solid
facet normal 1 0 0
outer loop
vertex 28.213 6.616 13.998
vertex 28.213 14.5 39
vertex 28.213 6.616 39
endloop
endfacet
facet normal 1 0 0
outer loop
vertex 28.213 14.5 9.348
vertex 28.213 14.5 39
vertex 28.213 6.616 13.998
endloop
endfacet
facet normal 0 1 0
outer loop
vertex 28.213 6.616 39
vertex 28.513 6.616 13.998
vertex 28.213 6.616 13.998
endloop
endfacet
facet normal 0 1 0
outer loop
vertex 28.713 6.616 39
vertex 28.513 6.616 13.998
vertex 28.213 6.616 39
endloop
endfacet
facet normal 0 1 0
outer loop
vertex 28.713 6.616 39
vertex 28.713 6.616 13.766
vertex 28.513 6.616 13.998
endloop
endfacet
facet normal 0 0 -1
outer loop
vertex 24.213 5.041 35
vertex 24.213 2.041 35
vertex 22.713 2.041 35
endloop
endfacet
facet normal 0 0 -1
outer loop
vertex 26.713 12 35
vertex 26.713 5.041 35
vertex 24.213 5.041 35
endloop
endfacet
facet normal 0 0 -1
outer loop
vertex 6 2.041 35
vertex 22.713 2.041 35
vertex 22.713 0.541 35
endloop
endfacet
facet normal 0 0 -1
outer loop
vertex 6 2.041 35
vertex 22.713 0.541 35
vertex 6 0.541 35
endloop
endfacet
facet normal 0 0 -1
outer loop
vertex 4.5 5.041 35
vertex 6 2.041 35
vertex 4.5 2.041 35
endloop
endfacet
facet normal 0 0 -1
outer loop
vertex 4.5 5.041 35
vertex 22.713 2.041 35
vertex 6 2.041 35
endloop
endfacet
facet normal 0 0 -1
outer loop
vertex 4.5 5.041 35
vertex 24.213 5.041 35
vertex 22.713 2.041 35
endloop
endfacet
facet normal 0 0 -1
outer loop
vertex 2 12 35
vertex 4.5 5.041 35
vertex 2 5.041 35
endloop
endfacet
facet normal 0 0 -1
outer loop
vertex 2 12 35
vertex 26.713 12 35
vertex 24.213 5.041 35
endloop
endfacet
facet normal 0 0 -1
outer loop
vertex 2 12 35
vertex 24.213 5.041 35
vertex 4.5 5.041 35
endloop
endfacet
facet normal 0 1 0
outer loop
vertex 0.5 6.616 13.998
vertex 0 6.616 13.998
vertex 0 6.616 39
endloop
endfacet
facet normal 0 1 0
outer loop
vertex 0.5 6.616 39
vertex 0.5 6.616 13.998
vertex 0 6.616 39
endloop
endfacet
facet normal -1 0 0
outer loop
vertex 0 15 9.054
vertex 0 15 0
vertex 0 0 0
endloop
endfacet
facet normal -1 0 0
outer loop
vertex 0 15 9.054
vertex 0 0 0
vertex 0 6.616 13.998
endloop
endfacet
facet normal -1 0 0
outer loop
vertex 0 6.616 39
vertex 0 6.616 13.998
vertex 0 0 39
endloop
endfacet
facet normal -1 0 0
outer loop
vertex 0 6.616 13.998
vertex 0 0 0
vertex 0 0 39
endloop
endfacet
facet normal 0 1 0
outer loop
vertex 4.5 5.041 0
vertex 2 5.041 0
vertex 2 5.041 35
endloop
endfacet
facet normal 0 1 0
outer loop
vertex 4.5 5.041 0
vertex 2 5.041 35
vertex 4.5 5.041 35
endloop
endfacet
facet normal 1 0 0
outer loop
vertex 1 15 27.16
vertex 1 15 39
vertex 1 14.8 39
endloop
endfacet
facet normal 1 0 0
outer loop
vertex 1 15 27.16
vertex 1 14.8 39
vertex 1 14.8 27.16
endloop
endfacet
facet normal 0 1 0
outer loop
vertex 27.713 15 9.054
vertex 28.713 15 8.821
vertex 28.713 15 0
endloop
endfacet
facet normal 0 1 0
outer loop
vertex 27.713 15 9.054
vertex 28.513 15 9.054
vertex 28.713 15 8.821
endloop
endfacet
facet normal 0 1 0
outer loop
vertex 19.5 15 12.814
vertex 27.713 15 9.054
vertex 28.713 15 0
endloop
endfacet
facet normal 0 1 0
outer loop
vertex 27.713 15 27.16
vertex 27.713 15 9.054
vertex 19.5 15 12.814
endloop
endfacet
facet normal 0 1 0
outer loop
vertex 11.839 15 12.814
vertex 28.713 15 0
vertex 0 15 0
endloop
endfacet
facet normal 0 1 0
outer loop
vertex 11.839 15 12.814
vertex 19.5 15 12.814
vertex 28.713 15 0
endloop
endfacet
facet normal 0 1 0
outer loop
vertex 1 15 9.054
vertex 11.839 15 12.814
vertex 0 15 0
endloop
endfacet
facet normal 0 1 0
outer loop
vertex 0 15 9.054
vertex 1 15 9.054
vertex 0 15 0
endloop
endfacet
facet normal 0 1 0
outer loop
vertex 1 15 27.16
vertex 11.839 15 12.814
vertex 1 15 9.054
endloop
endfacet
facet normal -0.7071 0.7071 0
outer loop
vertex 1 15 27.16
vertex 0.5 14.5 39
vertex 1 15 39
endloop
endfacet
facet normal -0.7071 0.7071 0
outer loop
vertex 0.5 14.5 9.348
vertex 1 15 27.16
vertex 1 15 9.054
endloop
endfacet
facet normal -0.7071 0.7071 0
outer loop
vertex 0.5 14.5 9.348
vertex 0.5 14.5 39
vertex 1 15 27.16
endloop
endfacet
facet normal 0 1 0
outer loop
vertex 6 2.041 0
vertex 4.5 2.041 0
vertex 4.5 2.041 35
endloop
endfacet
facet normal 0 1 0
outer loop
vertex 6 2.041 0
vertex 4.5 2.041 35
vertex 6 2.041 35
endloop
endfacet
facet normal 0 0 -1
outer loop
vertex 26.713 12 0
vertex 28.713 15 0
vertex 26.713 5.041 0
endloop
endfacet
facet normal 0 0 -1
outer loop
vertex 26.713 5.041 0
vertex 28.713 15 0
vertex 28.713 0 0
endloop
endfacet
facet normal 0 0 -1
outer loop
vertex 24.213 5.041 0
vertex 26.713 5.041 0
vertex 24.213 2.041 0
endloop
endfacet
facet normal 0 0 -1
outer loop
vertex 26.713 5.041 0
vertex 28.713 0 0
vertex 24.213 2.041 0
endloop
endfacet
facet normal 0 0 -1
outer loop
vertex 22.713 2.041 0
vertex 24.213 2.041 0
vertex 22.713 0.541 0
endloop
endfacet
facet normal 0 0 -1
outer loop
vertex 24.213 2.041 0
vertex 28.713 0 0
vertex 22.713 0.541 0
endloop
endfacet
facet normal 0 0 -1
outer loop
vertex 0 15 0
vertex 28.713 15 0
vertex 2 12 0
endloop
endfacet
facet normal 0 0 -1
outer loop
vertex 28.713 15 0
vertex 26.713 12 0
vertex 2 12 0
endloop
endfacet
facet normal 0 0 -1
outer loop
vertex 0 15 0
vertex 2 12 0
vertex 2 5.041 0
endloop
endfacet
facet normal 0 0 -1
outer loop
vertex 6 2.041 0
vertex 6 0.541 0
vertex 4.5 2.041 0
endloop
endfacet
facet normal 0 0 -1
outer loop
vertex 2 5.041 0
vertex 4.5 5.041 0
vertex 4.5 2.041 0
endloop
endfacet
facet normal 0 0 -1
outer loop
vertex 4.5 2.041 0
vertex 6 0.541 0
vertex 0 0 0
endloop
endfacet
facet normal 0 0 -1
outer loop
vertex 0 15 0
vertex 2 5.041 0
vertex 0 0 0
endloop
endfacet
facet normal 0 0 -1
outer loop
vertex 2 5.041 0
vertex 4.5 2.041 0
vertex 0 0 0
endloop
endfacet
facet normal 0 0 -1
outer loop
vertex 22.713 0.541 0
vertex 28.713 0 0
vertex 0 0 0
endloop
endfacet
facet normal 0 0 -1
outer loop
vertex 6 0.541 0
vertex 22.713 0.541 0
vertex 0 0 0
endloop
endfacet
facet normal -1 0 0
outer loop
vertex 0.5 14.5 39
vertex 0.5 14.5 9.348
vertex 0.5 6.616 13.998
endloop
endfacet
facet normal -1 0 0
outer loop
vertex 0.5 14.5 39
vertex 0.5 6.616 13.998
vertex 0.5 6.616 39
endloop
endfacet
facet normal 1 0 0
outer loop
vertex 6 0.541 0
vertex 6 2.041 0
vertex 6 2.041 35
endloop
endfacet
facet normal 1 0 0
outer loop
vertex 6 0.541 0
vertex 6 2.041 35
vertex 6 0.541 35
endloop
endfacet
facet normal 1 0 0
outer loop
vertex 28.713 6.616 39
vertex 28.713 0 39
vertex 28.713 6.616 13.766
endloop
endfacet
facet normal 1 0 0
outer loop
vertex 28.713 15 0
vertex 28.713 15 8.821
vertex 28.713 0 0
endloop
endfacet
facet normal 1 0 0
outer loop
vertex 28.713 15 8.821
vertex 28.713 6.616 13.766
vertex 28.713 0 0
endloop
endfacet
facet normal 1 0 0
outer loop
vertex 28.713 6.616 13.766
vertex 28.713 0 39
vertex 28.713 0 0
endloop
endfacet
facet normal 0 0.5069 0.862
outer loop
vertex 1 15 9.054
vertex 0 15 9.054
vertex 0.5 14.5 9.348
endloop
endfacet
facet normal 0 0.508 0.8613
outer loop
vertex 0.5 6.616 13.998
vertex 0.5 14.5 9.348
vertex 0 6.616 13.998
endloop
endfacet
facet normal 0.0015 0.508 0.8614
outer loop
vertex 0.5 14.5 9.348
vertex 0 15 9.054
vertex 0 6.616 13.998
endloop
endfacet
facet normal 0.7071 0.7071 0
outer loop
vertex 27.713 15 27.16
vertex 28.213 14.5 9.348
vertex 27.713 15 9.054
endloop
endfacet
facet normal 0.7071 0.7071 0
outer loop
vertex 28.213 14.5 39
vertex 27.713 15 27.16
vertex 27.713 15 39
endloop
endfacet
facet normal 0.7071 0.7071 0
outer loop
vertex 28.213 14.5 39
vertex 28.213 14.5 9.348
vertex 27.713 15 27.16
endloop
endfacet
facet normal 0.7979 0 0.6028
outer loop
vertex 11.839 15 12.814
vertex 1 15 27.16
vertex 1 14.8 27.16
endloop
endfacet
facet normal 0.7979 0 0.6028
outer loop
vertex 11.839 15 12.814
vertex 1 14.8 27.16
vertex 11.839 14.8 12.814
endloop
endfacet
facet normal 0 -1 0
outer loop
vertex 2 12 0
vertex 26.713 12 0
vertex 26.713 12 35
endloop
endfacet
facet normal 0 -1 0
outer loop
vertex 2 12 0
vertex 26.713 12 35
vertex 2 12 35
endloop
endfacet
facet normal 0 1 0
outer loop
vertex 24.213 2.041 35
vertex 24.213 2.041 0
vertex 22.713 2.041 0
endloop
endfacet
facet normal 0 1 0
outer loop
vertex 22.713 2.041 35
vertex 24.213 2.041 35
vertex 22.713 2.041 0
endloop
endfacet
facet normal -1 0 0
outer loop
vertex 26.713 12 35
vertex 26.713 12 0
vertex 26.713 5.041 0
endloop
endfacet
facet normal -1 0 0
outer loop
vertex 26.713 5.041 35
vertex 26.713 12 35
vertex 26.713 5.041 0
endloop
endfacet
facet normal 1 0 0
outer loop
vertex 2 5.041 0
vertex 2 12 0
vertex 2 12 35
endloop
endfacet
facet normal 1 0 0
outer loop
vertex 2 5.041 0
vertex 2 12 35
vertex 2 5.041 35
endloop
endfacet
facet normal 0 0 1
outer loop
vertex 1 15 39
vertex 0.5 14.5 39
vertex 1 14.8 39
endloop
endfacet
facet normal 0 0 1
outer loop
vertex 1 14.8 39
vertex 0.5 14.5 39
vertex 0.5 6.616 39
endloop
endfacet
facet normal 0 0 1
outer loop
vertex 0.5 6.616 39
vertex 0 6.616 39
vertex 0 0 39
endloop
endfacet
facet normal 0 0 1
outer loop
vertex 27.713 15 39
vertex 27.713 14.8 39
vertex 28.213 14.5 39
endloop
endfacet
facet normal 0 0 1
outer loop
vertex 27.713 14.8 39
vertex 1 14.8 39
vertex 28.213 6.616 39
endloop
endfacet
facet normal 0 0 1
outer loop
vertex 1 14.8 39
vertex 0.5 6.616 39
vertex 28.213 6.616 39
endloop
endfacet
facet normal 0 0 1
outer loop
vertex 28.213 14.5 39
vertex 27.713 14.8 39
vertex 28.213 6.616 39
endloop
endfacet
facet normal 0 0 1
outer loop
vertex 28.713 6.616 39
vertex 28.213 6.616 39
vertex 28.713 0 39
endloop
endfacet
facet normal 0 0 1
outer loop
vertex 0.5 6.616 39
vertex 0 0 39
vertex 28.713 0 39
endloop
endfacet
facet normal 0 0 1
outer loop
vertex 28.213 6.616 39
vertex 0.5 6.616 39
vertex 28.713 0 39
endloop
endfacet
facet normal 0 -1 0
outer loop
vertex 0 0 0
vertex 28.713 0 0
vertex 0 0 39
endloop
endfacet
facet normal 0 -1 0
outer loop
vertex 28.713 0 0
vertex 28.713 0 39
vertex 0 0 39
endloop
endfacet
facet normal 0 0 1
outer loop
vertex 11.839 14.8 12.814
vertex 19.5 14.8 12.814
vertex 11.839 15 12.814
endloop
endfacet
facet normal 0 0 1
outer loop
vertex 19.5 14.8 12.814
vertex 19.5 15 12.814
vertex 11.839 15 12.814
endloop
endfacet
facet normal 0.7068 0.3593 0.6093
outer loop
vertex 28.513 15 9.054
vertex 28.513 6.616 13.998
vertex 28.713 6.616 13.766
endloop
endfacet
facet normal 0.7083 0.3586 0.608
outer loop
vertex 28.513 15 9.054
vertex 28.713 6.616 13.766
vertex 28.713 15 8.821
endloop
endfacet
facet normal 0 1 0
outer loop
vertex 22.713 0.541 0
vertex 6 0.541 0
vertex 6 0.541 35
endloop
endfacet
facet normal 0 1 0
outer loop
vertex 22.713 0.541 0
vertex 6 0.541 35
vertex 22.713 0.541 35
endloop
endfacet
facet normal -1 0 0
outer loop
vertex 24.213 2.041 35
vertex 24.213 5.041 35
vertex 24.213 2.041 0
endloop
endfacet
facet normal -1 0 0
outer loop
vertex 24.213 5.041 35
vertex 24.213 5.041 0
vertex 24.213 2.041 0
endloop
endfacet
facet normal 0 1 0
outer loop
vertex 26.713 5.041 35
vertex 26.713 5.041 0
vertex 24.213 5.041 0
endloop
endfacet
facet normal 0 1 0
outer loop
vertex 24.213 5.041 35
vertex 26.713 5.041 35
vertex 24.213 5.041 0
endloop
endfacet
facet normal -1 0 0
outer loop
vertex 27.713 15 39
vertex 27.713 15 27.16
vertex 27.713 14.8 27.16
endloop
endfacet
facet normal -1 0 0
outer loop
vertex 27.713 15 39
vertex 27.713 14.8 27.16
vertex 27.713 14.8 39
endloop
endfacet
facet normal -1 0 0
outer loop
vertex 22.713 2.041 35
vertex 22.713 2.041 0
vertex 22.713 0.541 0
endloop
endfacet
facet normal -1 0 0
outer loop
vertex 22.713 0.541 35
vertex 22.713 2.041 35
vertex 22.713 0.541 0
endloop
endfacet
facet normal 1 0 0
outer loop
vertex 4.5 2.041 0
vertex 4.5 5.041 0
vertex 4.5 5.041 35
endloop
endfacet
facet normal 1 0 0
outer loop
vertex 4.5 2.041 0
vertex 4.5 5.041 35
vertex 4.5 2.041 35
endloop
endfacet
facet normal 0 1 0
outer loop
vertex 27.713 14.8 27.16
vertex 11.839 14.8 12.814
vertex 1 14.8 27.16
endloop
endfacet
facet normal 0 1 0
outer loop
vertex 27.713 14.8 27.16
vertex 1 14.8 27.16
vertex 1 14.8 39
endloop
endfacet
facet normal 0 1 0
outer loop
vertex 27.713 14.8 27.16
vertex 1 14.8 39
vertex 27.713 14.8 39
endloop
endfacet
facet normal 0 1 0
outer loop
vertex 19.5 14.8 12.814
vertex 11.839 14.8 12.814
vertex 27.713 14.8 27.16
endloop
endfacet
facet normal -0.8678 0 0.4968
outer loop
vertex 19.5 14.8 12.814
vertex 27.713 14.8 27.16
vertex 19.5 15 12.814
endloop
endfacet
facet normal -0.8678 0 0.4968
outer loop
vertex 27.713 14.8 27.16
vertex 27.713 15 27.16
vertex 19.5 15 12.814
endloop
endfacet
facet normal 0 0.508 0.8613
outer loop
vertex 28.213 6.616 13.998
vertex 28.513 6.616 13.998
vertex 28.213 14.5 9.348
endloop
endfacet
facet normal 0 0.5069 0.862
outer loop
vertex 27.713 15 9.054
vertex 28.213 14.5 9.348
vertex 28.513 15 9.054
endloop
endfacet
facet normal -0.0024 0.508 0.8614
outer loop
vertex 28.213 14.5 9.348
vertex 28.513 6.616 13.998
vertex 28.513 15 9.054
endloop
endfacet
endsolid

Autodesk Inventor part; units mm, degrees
ref_plane "YZ Plane" through (0, 0, 0) normal (1, 0, 0) x (0, 1, 0)
ref_plane "XZ Plane" through (0, 0, 0) normal (0, 1, 0) x (-1, 0, 0)
ref_plane "XY Plane" through (0, 0, 0) normal (0, 0, 1) x (1, 0, 0)
sketch "Sketch1" plane through (0, 0, 0) normal (0, 1, 0) x (-1, 0, 0)
  line L0 (0, 0) -> (0, 39)
  line L1 (0, 39) -> (-28.713, 39)
  line L2 (-28.713, 39) -> (-28.713, 0)
  line L3 (-28.713, 0) -> (0, 0)
  dimension "d0" = 39
  dimension "d1" = 28.713
extrude "Extrusion1" add sketch "Sketch1" along normal blind 15
sketch "Sketch2" plane through (28.713, 0, 0) normal (0, 0, -1) x (-1, 0, 0)
  line L0 (28.713, 0) -> (28.713, 15) projected
  line L1 (0, 0) -> (28.713, 0) projected
  line L2 (2, 12) -> (26.713, 12)
  line L3 (2, 5.0411) -> (4.5, 5.0411)
  line L4 (4.5, 5.0411) -> (4.5, 2.0411)
  line L5 (4.5, 2.0411) -> (6, 2.0411)
  line L6 (6, 2.0411) -> (6, 0.5411)
  line L7 (6, 0.5411) -> (19.8539, 0.5411)
  line L8 (26.713, 5.0411) -> (24.213, 5.0411)
  line L9 (24.213, 5.0411) -> (24.213, 2.0411)
  line L10 (24.213, 2.0411) -> (22.713, 2.0411)
  line L11 (22.713, 2.0411) -> (22.713, 0.5411)
  line L12 (22.713, 0.5411) -> (19.8539, 0.5411)
  line L13 (2, 12) -> (2, 5.0411)
  line L14 (26.713, 12) -> (26.713, 5.0411)
  point P0 (0, 15)
  dimension "d7" = 2.5
  dimension "d8" = 3
  dimension "d9" = 1.5
  dimension "d10" = 1.5
  dimension "d11" = 2.5
  dimension "d12" = 3
  dimension "d13" = 1.5
  dimension "d14" = 1.5
extrude "Extrusion2" cut sketch "Sketch2" against normal blind 35
sketch "Sketch3" plane through (28.713, 0, 39) normal (1, 0, 0) x (0, 0, -1)
  line L0 (25.0019, 6.616) -> (0, 6.616)
  line L1 (0, 0) -> (0, 15) projected
  line L2 (25.0019, 6.616) -> (29.9465, 15)
  line L3 (0, 15) -> (39, 15) projected
  line L4 (29.9465, 15) -> (0, 15)
  line L5 (0, 6.616) -> (0, 15)
  point P0 (39, 0)
extrude "Extrusion3" cut sketch "Sketch3" against normal blind 0.5
chamfer "Chamfer1" distance 0.2 angle 45 1 edges at (28.713, 10.808, 11.5258)
sketch "Sketch4" plane through (0, 0, 0) normal (-1, 0, 0) x (0, 0, 1)
  line L0 (13.9981, 6.616) -> (39, 6.616) projected
  line L1 (39, 6.616) -> (13.9981, 6.616)
  line L2 (9.0535, 15) -> (13.9981, 6.616) projected
  line L3 (13.9981, 6.616) -> (9.0535, 15)
  line L4 (0, 15) -> (39, 15) projected
  line L5 (9.0535, 15) -> (39, 15)
  line L6 (39, 15) -> (39, 6.616)
  line L7 (39, 0) -> (39, 15) projected
  point P0 (0, 0)
extrude "Extrusion4" cut sketch "Sketch4" against normal blind 0.5
chamfer "Chamfer2" distance 0.5 angle 45 2 edges at (0.5, 15, 24.0267) (28.213, 15, 24.0267)
sketch "Sketch5" plane through (0, 15, 0) normal (0, 1, 0) x (1, 0, 0)
  line L0 (27.713, -9.0535) -> (27.713, -39) projected
  line L1 (27.713, -27.1604) -> (19.4998, -12.8142)
  line L2 (19.4998, -12.8142) -> (11.8392, -12.8142)
  line L3 (27.713, -39) -> (28.213, -39) projected
  line L4 (27.713, -27.1604) -> (27.713, -39)
  line L5 (1, -39) -> (27.713, -39) projected
  line L6 (27.713, -39) -> (1, -39)
  line L7 (1, -39) -> (1, -27.1604)
  line L8 (1, -39) -> (1, -9.0535) projected
  line L9 (1, -27.1604) -> (11.8392, -12.8142)
  point P0 (0, 0)
extrude "Extrusion5" cut sketch "Sketch5" against normal blind 0.2
properties part number "Port 1"
